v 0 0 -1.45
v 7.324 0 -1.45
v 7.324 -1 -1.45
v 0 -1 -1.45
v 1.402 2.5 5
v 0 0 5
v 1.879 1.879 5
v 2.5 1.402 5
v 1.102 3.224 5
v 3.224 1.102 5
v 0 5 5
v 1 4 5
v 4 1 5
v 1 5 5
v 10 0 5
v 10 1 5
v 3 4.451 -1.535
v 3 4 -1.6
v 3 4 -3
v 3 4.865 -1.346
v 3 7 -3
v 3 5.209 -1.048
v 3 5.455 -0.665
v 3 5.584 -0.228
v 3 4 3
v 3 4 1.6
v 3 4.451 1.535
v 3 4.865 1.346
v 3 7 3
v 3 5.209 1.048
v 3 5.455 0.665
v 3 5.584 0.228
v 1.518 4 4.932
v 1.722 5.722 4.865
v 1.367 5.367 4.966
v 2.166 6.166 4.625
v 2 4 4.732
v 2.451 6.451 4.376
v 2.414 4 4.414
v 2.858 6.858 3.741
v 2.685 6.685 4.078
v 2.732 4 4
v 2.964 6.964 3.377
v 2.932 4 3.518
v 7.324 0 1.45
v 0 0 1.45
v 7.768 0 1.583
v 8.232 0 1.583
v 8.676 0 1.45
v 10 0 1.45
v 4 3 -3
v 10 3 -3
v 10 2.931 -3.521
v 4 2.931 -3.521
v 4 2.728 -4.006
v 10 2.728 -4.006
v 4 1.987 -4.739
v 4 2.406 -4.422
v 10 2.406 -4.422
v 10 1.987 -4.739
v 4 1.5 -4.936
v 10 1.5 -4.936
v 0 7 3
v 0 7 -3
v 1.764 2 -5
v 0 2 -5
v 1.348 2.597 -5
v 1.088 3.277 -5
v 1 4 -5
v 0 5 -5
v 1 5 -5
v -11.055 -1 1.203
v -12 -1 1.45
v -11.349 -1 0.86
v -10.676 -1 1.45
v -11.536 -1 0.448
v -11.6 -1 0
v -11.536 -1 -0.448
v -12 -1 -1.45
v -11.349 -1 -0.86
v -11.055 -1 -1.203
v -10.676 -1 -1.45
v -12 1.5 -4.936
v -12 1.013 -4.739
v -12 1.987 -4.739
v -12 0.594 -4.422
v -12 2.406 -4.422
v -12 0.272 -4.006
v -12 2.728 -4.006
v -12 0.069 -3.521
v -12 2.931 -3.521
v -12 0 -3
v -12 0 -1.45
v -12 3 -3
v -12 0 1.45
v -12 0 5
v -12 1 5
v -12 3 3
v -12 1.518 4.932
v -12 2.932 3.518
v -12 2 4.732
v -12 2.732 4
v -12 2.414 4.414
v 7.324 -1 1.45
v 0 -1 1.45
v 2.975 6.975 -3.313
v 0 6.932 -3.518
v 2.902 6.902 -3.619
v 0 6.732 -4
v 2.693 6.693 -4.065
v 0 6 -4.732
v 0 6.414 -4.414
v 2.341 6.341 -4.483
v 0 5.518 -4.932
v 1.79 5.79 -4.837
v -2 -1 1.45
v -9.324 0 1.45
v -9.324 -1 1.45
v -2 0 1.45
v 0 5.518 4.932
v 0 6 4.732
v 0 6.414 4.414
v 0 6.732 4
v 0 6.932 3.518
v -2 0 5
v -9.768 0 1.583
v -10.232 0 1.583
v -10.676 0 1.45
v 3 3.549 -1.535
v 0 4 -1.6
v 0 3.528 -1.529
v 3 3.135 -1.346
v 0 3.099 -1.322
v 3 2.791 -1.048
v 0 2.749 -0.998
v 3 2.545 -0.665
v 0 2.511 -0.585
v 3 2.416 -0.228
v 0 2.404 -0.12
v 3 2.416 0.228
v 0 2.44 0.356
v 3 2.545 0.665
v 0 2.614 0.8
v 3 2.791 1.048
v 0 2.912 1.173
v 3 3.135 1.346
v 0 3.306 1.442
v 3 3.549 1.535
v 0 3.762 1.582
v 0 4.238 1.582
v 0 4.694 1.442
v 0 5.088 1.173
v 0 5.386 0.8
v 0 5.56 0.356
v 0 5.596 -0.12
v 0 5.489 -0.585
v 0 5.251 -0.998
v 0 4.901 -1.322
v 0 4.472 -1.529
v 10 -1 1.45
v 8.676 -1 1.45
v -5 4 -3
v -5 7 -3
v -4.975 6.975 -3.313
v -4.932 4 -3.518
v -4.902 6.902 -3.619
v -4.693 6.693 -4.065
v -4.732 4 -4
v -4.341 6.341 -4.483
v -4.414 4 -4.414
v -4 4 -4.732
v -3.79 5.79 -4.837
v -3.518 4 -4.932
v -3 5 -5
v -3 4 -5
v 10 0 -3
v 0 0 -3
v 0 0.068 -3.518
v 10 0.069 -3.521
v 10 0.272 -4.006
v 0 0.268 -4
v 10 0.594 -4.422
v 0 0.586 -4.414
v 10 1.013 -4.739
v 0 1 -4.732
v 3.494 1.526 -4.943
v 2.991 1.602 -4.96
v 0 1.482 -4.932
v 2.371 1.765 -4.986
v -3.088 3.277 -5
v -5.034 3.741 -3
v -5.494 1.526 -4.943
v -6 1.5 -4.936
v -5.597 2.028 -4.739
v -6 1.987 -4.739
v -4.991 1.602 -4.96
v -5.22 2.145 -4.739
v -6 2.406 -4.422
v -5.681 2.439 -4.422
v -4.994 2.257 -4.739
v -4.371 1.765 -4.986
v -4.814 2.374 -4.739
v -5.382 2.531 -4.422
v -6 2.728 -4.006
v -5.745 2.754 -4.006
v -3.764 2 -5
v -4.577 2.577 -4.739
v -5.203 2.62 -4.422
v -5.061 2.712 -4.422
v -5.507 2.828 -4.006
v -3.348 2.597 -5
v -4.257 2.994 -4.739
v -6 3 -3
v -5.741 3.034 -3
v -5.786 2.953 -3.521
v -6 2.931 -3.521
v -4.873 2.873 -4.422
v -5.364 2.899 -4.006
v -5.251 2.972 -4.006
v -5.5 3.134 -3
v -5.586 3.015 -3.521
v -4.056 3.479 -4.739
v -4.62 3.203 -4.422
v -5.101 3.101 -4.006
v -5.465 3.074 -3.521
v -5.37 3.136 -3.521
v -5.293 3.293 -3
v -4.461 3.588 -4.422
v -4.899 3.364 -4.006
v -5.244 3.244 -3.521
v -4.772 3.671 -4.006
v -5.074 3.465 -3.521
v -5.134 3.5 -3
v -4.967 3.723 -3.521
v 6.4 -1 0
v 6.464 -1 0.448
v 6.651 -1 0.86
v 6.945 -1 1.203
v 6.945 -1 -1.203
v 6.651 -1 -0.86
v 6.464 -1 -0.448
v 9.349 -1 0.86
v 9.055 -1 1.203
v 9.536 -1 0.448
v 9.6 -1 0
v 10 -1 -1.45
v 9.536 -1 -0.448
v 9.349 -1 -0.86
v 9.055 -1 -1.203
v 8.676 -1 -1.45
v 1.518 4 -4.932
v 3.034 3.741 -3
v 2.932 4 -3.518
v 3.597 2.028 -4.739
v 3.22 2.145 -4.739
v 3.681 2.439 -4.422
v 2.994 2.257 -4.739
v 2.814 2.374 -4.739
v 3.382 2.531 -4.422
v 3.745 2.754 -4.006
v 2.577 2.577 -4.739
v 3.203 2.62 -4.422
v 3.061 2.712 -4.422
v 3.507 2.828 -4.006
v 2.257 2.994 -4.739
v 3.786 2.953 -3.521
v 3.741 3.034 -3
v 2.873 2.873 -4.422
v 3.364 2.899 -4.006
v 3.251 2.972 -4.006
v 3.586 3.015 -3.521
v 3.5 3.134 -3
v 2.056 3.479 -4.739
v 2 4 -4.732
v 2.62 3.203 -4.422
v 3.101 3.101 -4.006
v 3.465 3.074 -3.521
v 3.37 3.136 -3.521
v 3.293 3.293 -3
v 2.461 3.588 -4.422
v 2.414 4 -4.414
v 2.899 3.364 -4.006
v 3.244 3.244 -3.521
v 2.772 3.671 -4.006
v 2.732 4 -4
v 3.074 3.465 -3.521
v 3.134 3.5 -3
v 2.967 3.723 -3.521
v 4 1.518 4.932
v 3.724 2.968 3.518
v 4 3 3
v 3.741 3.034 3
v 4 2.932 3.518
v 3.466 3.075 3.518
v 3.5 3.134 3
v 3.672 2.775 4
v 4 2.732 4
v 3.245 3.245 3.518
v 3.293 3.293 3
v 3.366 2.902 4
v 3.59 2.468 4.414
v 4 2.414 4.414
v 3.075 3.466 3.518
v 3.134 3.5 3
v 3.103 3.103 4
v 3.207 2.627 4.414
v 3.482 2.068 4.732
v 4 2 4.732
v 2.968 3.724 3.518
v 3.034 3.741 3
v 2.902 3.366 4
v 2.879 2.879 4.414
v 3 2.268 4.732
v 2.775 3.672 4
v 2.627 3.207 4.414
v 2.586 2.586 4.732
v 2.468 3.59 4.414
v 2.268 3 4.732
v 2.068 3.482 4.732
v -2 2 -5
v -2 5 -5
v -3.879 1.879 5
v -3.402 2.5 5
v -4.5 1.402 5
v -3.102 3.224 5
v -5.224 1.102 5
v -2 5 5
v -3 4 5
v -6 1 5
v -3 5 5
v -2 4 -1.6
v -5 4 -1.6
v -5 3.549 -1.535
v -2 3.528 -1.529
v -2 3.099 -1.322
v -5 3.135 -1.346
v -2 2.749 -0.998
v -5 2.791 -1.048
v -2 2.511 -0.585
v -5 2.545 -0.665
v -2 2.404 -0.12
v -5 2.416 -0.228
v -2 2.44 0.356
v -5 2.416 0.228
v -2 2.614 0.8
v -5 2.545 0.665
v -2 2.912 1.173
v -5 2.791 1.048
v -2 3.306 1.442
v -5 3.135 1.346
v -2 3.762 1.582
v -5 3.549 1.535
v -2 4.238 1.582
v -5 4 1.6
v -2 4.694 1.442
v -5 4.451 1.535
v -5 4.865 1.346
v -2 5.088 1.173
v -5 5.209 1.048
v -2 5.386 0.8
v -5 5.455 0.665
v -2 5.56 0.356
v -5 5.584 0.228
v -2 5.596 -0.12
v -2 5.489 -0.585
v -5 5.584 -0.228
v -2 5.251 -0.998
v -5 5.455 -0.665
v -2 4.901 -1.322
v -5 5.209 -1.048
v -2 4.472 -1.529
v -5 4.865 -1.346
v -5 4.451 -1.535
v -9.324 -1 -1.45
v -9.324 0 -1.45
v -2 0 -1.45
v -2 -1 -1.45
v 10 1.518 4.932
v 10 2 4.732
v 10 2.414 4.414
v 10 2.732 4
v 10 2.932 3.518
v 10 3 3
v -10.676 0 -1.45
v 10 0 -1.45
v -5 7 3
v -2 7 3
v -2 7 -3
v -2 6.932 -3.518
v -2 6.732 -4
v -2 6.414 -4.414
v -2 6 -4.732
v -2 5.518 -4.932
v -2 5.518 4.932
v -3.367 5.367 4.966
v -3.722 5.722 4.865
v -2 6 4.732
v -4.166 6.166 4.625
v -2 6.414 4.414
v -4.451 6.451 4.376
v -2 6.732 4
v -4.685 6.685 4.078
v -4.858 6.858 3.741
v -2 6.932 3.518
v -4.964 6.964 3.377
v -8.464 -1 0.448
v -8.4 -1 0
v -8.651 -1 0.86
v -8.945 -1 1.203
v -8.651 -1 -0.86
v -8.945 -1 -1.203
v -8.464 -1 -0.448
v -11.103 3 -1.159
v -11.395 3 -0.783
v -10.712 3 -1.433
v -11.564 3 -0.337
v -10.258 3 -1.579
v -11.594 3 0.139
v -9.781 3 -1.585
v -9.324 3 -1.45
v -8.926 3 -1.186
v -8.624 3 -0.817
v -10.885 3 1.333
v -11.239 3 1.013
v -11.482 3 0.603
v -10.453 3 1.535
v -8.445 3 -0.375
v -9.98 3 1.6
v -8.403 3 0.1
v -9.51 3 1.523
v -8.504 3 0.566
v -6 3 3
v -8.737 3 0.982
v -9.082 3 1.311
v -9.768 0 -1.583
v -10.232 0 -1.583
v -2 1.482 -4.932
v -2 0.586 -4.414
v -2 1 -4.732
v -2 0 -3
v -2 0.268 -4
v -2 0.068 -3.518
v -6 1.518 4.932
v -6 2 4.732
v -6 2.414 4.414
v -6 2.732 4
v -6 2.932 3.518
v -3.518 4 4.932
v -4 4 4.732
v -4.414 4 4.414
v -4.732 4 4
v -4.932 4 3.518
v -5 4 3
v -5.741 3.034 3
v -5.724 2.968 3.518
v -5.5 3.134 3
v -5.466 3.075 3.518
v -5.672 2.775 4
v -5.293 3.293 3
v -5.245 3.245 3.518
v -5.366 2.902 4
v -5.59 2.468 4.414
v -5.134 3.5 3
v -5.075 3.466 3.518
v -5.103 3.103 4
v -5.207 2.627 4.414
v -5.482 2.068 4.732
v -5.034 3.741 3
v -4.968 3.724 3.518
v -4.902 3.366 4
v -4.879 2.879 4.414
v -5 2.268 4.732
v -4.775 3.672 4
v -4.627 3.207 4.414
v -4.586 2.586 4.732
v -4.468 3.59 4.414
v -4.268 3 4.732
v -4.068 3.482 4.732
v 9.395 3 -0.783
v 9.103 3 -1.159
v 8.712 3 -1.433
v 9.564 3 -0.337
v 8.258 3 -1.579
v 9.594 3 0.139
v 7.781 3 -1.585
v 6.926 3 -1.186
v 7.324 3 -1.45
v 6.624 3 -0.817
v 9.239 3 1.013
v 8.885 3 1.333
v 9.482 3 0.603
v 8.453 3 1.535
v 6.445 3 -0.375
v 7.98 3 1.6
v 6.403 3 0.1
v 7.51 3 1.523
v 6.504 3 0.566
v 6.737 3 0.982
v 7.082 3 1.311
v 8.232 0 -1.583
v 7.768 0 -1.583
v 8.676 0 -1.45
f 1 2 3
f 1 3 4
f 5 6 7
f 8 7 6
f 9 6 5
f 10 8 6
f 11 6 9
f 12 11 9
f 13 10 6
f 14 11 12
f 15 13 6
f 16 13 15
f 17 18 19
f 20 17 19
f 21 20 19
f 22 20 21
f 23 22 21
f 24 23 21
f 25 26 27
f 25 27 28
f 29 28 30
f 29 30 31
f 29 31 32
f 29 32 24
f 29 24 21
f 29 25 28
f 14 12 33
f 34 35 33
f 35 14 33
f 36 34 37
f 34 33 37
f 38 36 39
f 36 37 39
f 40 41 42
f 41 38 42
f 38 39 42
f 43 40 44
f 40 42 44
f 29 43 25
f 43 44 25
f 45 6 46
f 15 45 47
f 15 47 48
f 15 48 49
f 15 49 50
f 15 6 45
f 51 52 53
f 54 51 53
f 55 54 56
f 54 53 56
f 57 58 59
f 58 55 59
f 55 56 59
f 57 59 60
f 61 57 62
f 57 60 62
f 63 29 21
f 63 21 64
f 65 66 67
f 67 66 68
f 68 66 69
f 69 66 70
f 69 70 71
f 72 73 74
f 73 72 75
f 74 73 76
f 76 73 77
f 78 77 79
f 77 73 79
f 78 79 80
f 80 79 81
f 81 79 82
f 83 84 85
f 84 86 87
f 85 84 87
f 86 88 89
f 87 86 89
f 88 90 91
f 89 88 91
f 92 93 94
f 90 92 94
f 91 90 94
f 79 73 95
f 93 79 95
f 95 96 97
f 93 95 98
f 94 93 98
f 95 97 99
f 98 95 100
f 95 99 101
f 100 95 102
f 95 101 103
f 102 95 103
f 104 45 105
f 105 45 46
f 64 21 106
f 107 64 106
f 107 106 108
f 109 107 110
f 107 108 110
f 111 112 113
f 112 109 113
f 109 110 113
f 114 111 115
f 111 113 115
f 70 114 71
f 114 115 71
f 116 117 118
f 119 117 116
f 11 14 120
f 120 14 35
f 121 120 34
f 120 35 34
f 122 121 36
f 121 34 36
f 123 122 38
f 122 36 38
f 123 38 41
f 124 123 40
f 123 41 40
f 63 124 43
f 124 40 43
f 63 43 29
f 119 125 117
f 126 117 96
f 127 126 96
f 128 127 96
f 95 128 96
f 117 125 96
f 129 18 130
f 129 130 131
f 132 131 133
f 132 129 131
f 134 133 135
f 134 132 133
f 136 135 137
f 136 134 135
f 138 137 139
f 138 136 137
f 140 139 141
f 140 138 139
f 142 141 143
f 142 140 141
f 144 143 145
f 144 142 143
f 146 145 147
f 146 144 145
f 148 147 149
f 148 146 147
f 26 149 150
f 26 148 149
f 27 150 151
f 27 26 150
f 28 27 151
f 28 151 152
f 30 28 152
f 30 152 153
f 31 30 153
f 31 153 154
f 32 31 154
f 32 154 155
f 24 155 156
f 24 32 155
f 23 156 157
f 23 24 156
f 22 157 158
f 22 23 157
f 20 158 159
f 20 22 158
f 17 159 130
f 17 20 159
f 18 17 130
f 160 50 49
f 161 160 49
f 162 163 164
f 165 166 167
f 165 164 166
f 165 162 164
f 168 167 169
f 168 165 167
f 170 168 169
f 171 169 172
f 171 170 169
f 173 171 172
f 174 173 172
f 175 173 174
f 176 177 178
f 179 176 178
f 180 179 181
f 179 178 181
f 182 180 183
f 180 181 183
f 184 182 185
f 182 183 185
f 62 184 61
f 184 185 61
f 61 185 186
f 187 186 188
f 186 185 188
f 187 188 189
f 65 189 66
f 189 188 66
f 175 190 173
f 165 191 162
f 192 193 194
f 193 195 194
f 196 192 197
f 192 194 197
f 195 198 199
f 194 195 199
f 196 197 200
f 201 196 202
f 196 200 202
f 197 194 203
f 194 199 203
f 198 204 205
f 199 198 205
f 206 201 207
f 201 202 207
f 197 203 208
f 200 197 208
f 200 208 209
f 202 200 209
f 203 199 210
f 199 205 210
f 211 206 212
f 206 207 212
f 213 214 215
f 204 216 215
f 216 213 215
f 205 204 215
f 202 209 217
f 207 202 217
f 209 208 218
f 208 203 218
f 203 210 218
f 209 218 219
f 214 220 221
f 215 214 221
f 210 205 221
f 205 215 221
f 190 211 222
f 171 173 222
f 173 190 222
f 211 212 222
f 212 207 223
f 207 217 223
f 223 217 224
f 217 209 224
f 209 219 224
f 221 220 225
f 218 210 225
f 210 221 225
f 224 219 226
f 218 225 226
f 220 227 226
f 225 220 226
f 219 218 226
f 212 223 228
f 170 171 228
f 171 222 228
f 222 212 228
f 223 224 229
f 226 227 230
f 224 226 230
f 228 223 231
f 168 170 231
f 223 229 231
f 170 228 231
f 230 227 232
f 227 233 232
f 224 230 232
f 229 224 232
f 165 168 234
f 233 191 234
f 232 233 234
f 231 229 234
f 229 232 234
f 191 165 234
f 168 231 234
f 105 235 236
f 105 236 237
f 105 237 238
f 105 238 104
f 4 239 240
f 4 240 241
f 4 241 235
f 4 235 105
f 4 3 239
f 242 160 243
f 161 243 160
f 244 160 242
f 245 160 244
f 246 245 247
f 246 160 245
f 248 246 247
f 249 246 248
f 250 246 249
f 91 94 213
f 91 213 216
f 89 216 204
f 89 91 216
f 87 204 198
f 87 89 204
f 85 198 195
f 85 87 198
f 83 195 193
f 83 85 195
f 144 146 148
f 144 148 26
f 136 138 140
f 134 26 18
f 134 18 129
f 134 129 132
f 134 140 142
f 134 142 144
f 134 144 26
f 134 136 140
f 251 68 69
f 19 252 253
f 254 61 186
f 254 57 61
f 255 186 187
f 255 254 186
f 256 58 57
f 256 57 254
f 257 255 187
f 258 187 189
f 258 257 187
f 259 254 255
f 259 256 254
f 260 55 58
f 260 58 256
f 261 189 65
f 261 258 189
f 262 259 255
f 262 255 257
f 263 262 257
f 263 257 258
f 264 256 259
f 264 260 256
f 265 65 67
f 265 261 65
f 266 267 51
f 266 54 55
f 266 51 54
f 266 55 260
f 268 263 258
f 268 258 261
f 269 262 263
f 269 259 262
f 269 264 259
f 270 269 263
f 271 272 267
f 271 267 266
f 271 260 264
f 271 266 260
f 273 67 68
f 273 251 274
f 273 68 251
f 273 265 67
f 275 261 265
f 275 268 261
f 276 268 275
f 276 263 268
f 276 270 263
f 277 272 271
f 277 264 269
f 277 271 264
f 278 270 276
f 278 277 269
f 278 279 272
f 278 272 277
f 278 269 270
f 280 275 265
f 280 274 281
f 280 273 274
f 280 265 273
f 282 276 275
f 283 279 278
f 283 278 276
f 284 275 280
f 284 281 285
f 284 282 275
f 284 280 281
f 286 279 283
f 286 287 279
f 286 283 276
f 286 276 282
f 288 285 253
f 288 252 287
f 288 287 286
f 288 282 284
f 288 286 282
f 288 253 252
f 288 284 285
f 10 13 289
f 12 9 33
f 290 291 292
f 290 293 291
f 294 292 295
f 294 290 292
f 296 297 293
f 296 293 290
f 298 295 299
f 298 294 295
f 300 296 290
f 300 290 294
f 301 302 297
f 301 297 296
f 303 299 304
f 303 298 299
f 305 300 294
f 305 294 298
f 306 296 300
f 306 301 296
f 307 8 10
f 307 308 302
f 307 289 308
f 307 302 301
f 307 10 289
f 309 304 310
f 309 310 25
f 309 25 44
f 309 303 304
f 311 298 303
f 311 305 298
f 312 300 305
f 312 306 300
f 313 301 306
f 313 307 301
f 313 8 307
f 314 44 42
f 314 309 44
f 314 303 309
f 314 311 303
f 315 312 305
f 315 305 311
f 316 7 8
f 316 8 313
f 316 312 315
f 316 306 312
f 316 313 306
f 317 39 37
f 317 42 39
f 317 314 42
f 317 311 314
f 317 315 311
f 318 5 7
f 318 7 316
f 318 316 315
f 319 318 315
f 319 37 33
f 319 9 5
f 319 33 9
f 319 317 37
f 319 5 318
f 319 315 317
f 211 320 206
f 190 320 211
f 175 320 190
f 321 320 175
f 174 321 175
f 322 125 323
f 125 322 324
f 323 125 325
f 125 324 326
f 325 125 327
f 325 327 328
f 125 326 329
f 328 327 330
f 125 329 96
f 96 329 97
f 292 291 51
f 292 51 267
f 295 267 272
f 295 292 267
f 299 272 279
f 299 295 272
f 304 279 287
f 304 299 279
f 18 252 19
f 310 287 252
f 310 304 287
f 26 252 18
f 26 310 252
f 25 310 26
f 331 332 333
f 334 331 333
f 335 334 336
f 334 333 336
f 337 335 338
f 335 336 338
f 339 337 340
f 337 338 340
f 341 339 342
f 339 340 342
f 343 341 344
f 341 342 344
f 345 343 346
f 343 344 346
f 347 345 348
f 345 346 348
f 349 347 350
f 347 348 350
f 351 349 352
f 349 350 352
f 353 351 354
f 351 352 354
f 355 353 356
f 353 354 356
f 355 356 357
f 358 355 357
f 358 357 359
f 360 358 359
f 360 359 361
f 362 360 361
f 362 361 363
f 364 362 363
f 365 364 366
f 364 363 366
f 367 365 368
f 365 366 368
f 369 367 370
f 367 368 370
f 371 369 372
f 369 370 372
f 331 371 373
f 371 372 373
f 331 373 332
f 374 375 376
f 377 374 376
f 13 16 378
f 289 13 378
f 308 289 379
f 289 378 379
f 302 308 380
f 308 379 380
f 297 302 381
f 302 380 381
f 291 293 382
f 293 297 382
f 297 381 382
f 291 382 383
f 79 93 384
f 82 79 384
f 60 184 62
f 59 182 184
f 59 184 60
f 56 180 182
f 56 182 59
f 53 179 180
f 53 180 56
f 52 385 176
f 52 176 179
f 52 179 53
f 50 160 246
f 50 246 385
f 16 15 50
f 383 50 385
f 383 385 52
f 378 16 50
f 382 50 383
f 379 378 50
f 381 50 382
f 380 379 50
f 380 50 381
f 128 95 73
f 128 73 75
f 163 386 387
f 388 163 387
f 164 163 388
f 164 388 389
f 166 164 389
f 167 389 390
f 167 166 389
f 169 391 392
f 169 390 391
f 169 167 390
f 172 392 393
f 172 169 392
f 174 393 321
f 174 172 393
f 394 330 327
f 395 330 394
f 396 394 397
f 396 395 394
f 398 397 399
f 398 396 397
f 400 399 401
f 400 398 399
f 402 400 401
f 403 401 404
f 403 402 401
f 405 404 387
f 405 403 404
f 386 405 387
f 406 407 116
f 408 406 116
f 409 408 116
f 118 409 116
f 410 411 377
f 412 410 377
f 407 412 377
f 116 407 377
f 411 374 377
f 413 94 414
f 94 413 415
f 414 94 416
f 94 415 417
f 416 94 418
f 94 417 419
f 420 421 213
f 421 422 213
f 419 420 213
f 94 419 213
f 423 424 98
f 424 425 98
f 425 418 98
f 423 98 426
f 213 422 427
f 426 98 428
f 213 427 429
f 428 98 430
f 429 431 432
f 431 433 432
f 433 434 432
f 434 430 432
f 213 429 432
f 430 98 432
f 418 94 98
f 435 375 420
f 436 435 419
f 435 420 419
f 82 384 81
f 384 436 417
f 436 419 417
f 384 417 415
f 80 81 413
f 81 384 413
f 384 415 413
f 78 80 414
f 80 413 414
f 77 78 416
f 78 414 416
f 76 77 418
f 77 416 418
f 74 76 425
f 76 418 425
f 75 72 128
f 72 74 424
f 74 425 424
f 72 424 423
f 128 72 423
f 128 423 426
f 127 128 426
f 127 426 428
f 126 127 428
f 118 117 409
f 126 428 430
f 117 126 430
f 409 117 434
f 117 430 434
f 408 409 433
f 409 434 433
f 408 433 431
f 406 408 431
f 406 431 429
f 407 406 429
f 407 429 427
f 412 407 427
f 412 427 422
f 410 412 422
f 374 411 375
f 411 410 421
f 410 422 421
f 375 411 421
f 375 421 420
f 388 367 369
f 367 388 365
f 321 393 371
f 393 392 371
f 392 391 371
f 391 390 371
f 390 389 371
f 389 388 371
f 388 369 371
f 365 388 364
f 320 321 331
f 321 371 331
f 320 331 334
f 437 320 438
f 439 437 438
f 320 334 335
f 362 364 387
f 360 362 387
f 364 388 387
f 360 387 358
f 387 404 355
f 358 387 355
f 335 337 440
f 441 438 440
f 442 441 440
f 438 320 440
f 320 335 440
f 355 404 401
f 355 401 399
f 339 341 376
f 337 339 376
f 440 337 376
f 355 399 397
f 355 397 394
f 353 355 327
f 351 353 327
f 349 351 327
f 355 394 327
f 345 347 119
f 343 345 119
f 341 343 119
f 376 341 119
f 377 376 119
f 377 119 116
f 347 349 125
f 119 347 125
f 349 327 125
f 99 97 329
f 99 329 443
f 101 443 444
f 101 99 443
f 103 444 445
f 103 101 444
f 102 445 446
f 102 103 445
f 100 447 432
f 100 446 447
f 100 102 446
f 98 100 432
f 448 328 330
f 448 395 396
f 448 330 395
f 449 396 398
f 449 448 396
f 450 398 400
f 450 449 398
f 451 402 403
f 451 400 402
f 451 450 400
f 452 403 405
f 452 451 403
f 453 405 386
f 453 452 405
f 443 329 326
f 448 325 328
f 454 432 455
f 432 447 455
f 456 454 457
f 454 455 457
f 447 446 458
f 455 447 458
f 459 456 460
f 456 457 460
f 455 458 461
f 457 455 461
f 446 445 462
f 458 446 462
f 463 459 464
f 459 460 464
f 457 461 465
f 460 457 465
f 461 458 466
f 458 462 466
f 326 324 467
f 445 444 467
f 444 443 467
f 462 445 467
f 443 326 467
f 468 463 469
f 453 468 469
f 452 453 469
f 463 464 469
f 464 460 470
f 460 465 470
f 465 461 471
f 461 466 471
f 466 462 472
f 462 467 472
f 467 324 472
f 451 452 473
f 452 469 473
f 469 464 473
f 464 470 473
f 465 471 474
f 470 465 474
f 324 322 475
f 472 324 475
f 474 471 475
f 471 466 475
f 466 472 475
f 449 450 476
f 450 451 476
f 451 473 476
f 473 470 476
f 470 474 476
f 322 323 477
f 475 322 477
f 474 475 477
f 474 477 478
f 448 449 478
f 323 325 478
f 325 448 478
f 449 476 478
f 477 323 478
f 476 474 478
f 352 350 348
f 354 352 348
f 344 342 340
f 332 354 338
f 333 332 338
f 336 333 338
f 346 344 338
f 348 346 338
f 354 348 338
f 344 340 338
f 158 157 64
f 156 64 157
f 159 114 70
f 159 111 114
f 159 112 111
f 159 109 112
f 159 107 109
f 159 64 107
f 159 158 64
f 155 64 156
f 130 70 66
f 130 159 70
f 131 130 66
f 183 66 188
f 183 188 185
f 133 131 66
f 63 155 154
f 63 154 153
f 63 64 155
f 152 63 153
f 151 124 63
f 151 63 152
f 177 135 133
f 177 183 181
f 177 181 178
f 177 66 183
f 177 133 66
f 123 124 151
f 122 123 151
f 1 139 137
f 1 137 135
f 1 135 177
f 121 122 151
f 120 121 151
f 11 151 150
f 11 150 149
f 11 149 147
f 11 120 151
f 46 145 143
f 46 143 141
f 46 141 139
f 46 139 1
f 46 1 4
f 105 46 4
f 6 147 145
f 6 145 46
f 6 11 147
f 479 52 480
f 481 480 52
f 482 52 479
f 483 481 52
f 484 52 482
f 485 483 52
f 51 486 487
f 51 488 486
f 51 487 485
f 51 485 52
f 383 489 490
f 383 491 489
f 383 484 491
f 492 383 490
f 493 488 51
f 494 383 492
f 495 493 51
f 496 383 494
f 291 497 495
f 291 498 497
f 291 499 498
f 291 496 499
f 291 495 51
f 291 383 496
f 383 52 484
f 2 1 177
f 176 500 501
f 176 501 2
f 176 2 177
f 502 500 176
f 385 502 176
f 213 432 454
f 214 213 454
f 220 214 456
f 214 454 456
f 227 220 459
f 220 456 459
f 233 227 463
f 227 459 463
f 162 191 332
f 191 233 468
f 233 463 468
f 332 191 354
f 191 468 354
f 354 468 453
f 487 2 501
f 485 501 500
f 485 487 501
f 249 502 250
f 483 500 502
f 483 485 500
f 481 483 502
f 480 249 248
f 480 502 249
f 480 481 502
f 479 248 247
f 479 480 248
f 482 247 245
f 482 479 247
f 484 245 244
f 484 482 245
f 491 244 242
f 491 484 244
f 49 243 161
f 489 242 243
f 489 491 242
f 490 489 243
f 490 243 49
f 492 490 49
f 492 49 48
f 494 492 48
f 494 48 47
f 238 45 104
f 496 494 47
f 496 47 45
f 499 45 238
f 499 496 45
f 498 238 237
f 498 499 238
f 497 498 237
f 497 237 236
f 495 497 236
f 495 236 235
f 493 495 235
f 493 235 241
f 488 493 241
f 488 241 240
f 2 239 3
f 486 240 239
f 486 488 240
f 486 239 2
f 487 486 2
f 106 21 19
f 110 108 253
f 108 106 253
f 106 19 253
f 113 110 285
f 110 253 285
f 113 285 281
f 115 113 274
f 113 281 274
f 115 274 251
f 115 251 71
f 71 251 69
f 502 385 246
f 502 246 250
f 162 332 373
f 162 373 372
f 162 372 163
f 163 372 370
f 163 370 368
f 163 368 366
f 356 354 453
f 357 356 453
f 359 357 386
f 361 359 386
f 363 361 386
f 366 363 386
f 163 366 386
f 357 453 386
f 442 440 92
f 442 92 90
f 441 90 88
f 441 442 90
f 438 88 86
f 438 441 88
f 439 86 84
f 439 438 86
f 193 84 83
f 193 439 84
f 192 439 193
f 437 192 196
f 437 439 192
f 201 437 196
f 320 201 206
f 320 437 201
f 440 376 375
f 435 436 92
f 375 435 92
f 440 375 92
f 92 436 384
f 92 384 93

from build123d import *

# Parameters (mm, degrees)
MAIN_DEPTH               = 5
VERTICALHOLE_DEPTH       = 14.190905958
VERTICALHOLE_DEPTH_BACK  = 3
ESQUISSE2_R              = 1.6
ESQUISSE5_W              = 10
ESQUISSE5_H              = 2.9
MAKERBEAMSUPPORT_DEPTH   = 1
MAKERBEAMHOLE_DEPTH      = 14.190905958
MAKERBEAMHOLE_DEPTH_BACK = 14.190905958
ESQUISSE3_R              = 1.6
FILLET1_R                = 2


with BuildPart() as part:
    # Esquisse1 → Main (new, symmetric)
    with BuildSketch(Plane.XY):
        with BuildLine():
            Line((0, 0), (10, 0))
            Line((10, 0), (10, 3))
            Line((10, 3), (4, 3))
            ThreePointArc((4, 3), (3.292893219, 3.292893219), (3, 4))
            Line((3, 4), (3, 7))
            Line((3, 7), (0, 7))
            Line((0, 7), (0, 0))
        make_face()
    extrude(amount=MAIN_DEPTH, both=True)

    # Esquisse2 → VerticalHole (cut, two sides: drawn at the far end of the back side and taken through both)
    with BuildSketch(Plane.ZY.offset(-VERTICALHOLE_DEPTH_BACK)):
        with Locations(Location((0, 4, 0), (0, 0, 180))):
            Circle(ESQUISSE2_R)
    extrude(amount=VERTICALHOLE_DEPTH + VERTICALHOLE_DEPTH_BACK, mode=Mode.SUBTRACT)

    # Esquisse5 → MakerBeamSupport (add)
    with BuildSketch(Plane(origin=(0, 0, 0), x_dir=(-1, 0, 0), z_dir=(0, -1, 0))):
        with Locations((-5, 0)):
            Rectangle(ESQUISSE5_W, ESQUISSE5_H)
    extrude(amount=MAKERBEAMSUPPORT_DEPTH)

    # Esquisse3 → MakerBeamHole (cut, two sides: drawn at the far end of the back side and taken through both)
    with BuildSketch(Plane.XZ.offset(-MAKERBEAMHOLE_DEPTH_BACK)):
        with Locations(Location((8, 0, 0), (0, 0, 244.992166765))):
            Circle(ESQUISSE3_R)
    extrude(amount=MAKERBEAMHOLE_DEPTH + MAKERBEAMHOLE_DEPTH_BACK, mode=Mode.SUBTRACT)

    # Fillet1
    # the kernel refuses this fillet: 2 mm, written as the material it takes off along each edge
    with BuildSketch(Plane(origin=(3, 4, -5), x_dir=(-1, 0, 0), z_dir=(0, 1, 0))) as fillet1_piece_1:
        with BuildLine():
            CenterArc((FILLET1_R, FILLET1_R), FILLET1_R, 180, 90)
            Line((0, FILLET1_R), (0, 0))
            Line((0, 0), (FILLET1_R, 0))
        make_face()
    extrude(amount=8, mode=Mode.SUBTRACT)
    with BuildSketch(Plane(origin=(4, 4, -5), x_dir=(0, -1, 0), z_dir=(1, 0, 0))) as fillet1_piece_2:
        with BuildLine():
            CenterArc((1 + FILLET1_R, -FILLET1_R), FILLET1_R, 90, 90)
            Line((1, -FILLET1_R), (1, 0))
            Line((1, 0), (1 + FILLET1_R, 0))
        make_face()
    revolve(axis=Axis((4, 4, -5), (0, 0, -1)), revolution_arc=90, mode=Mode.SUBTRACT)
    with BuildSketch(Plane(origin=(3, 4, 5), x_dir=(-1, 0, 0), z_dir=(0, 1, 0))) as fillet1_piece_3:
        with BuildLine():
            CenterArc((FILLET1_R, -FILLET1_R), FILLET1_R, 90, 90)
            Line((0, -FILLET1_R), (0, 0))
            Line((0, 0), (FILLET1_R, 0))
        make_face()
    extrude(amount=8, mode=Mode.SUBTRACT)
    with BuildSketch(Plane(origin=(4, 4, 5), x_dir=(0, -1, 0), z_dir=(1, 0, 0))) as fillet1_piece_4:
        with BuildLine():
            CenterArc((1 + FILLET1_R, FILLET1_R), FILLET1_R, 180, 90)
            Line((1, FILLET1_R), (1, 0))
            Line((1, 0), (1 + FILLET1_R, 0))
        make_face()
    revolve(axis=Axis((4, 4, 5), (0, 0, -1)), revolution_arc=90, mode=Mode.SUBTRACT)
    with BuildSketch(Plane(origin=(15, 3, -5), x_dir=(0, -1, 0), z_dir=(-1, 0, 0)), Plane(origin=(15, 3, 5), x_dir=(0, 0, -1), z_dir=(-1, 0, 0))) as fillet1_piece_5:
        with BuildLine():
            CenterArc((FILLET1_R, FILLET1_R), FILLET1_R, 180, 90)
            Line((0, FILLET1_R), (0, 0))
            Line((0, 0), (FILLET1_R, 0))
        make_face()
    extrude(amount=11, mode=Mode.SUBTRACT)
    with BuildSketch(Plane(origin=(8, 7, -5), x_dir=(0, -1, 0), z_dir=(-1, 0, 0))) as fillet1_piece_6:
        with BuildLine():
            CenterArc((FILLET1_R, FILLET1_R), FILLET1_R, 180, 90)
            Line((0, FILLET1_R), (0, 0))
            Line((0, 0), (FILLET1_R, 0))
        make_face()
    extrude(amount=13, mode=Mode.SUBTRACT)
    with BuildSketch(Plane(origin=(8, 7, 5), x_dir=(0, -1, 0), z_dir=(-1, 0, 0))) as fillet1_piece_7:
        with BuildLine():
            CenterArc((FILLET1_R, -FILLET1_R), FILLET1_R, 90, 90)
            Line((0, -FILLET1_R), (0, 0))
            Line((0, 0), (FILLET1_R, 0))
        make_face()
    extrude(amount=13, mode=Mode.SUBTRACT)
    with BuildSketch(Plane(origin=(-5, 0, -5), x_dir=(0, 0, 1), z_dir=(1, 0, 0))) as fillet1_piece_8:
        with BuildLine():
            CenterArc((FILLET1_R, -FILLET1_R), FILLET1_R, 90, 90)
            Line((0, -FILLET1_R), (0, 0))
            Line((0, 0), (FILLET1_R, 0))
        make_face()
    extrude(amount=20, mode=Mode.SUBTRACT)


with BuildPart() as body_2:
    # Mirror2: mirrored copy
    add(part.part.mirror(Plane.ZY.offset(1)))


solid = Compound([part.part, body_2.part])
